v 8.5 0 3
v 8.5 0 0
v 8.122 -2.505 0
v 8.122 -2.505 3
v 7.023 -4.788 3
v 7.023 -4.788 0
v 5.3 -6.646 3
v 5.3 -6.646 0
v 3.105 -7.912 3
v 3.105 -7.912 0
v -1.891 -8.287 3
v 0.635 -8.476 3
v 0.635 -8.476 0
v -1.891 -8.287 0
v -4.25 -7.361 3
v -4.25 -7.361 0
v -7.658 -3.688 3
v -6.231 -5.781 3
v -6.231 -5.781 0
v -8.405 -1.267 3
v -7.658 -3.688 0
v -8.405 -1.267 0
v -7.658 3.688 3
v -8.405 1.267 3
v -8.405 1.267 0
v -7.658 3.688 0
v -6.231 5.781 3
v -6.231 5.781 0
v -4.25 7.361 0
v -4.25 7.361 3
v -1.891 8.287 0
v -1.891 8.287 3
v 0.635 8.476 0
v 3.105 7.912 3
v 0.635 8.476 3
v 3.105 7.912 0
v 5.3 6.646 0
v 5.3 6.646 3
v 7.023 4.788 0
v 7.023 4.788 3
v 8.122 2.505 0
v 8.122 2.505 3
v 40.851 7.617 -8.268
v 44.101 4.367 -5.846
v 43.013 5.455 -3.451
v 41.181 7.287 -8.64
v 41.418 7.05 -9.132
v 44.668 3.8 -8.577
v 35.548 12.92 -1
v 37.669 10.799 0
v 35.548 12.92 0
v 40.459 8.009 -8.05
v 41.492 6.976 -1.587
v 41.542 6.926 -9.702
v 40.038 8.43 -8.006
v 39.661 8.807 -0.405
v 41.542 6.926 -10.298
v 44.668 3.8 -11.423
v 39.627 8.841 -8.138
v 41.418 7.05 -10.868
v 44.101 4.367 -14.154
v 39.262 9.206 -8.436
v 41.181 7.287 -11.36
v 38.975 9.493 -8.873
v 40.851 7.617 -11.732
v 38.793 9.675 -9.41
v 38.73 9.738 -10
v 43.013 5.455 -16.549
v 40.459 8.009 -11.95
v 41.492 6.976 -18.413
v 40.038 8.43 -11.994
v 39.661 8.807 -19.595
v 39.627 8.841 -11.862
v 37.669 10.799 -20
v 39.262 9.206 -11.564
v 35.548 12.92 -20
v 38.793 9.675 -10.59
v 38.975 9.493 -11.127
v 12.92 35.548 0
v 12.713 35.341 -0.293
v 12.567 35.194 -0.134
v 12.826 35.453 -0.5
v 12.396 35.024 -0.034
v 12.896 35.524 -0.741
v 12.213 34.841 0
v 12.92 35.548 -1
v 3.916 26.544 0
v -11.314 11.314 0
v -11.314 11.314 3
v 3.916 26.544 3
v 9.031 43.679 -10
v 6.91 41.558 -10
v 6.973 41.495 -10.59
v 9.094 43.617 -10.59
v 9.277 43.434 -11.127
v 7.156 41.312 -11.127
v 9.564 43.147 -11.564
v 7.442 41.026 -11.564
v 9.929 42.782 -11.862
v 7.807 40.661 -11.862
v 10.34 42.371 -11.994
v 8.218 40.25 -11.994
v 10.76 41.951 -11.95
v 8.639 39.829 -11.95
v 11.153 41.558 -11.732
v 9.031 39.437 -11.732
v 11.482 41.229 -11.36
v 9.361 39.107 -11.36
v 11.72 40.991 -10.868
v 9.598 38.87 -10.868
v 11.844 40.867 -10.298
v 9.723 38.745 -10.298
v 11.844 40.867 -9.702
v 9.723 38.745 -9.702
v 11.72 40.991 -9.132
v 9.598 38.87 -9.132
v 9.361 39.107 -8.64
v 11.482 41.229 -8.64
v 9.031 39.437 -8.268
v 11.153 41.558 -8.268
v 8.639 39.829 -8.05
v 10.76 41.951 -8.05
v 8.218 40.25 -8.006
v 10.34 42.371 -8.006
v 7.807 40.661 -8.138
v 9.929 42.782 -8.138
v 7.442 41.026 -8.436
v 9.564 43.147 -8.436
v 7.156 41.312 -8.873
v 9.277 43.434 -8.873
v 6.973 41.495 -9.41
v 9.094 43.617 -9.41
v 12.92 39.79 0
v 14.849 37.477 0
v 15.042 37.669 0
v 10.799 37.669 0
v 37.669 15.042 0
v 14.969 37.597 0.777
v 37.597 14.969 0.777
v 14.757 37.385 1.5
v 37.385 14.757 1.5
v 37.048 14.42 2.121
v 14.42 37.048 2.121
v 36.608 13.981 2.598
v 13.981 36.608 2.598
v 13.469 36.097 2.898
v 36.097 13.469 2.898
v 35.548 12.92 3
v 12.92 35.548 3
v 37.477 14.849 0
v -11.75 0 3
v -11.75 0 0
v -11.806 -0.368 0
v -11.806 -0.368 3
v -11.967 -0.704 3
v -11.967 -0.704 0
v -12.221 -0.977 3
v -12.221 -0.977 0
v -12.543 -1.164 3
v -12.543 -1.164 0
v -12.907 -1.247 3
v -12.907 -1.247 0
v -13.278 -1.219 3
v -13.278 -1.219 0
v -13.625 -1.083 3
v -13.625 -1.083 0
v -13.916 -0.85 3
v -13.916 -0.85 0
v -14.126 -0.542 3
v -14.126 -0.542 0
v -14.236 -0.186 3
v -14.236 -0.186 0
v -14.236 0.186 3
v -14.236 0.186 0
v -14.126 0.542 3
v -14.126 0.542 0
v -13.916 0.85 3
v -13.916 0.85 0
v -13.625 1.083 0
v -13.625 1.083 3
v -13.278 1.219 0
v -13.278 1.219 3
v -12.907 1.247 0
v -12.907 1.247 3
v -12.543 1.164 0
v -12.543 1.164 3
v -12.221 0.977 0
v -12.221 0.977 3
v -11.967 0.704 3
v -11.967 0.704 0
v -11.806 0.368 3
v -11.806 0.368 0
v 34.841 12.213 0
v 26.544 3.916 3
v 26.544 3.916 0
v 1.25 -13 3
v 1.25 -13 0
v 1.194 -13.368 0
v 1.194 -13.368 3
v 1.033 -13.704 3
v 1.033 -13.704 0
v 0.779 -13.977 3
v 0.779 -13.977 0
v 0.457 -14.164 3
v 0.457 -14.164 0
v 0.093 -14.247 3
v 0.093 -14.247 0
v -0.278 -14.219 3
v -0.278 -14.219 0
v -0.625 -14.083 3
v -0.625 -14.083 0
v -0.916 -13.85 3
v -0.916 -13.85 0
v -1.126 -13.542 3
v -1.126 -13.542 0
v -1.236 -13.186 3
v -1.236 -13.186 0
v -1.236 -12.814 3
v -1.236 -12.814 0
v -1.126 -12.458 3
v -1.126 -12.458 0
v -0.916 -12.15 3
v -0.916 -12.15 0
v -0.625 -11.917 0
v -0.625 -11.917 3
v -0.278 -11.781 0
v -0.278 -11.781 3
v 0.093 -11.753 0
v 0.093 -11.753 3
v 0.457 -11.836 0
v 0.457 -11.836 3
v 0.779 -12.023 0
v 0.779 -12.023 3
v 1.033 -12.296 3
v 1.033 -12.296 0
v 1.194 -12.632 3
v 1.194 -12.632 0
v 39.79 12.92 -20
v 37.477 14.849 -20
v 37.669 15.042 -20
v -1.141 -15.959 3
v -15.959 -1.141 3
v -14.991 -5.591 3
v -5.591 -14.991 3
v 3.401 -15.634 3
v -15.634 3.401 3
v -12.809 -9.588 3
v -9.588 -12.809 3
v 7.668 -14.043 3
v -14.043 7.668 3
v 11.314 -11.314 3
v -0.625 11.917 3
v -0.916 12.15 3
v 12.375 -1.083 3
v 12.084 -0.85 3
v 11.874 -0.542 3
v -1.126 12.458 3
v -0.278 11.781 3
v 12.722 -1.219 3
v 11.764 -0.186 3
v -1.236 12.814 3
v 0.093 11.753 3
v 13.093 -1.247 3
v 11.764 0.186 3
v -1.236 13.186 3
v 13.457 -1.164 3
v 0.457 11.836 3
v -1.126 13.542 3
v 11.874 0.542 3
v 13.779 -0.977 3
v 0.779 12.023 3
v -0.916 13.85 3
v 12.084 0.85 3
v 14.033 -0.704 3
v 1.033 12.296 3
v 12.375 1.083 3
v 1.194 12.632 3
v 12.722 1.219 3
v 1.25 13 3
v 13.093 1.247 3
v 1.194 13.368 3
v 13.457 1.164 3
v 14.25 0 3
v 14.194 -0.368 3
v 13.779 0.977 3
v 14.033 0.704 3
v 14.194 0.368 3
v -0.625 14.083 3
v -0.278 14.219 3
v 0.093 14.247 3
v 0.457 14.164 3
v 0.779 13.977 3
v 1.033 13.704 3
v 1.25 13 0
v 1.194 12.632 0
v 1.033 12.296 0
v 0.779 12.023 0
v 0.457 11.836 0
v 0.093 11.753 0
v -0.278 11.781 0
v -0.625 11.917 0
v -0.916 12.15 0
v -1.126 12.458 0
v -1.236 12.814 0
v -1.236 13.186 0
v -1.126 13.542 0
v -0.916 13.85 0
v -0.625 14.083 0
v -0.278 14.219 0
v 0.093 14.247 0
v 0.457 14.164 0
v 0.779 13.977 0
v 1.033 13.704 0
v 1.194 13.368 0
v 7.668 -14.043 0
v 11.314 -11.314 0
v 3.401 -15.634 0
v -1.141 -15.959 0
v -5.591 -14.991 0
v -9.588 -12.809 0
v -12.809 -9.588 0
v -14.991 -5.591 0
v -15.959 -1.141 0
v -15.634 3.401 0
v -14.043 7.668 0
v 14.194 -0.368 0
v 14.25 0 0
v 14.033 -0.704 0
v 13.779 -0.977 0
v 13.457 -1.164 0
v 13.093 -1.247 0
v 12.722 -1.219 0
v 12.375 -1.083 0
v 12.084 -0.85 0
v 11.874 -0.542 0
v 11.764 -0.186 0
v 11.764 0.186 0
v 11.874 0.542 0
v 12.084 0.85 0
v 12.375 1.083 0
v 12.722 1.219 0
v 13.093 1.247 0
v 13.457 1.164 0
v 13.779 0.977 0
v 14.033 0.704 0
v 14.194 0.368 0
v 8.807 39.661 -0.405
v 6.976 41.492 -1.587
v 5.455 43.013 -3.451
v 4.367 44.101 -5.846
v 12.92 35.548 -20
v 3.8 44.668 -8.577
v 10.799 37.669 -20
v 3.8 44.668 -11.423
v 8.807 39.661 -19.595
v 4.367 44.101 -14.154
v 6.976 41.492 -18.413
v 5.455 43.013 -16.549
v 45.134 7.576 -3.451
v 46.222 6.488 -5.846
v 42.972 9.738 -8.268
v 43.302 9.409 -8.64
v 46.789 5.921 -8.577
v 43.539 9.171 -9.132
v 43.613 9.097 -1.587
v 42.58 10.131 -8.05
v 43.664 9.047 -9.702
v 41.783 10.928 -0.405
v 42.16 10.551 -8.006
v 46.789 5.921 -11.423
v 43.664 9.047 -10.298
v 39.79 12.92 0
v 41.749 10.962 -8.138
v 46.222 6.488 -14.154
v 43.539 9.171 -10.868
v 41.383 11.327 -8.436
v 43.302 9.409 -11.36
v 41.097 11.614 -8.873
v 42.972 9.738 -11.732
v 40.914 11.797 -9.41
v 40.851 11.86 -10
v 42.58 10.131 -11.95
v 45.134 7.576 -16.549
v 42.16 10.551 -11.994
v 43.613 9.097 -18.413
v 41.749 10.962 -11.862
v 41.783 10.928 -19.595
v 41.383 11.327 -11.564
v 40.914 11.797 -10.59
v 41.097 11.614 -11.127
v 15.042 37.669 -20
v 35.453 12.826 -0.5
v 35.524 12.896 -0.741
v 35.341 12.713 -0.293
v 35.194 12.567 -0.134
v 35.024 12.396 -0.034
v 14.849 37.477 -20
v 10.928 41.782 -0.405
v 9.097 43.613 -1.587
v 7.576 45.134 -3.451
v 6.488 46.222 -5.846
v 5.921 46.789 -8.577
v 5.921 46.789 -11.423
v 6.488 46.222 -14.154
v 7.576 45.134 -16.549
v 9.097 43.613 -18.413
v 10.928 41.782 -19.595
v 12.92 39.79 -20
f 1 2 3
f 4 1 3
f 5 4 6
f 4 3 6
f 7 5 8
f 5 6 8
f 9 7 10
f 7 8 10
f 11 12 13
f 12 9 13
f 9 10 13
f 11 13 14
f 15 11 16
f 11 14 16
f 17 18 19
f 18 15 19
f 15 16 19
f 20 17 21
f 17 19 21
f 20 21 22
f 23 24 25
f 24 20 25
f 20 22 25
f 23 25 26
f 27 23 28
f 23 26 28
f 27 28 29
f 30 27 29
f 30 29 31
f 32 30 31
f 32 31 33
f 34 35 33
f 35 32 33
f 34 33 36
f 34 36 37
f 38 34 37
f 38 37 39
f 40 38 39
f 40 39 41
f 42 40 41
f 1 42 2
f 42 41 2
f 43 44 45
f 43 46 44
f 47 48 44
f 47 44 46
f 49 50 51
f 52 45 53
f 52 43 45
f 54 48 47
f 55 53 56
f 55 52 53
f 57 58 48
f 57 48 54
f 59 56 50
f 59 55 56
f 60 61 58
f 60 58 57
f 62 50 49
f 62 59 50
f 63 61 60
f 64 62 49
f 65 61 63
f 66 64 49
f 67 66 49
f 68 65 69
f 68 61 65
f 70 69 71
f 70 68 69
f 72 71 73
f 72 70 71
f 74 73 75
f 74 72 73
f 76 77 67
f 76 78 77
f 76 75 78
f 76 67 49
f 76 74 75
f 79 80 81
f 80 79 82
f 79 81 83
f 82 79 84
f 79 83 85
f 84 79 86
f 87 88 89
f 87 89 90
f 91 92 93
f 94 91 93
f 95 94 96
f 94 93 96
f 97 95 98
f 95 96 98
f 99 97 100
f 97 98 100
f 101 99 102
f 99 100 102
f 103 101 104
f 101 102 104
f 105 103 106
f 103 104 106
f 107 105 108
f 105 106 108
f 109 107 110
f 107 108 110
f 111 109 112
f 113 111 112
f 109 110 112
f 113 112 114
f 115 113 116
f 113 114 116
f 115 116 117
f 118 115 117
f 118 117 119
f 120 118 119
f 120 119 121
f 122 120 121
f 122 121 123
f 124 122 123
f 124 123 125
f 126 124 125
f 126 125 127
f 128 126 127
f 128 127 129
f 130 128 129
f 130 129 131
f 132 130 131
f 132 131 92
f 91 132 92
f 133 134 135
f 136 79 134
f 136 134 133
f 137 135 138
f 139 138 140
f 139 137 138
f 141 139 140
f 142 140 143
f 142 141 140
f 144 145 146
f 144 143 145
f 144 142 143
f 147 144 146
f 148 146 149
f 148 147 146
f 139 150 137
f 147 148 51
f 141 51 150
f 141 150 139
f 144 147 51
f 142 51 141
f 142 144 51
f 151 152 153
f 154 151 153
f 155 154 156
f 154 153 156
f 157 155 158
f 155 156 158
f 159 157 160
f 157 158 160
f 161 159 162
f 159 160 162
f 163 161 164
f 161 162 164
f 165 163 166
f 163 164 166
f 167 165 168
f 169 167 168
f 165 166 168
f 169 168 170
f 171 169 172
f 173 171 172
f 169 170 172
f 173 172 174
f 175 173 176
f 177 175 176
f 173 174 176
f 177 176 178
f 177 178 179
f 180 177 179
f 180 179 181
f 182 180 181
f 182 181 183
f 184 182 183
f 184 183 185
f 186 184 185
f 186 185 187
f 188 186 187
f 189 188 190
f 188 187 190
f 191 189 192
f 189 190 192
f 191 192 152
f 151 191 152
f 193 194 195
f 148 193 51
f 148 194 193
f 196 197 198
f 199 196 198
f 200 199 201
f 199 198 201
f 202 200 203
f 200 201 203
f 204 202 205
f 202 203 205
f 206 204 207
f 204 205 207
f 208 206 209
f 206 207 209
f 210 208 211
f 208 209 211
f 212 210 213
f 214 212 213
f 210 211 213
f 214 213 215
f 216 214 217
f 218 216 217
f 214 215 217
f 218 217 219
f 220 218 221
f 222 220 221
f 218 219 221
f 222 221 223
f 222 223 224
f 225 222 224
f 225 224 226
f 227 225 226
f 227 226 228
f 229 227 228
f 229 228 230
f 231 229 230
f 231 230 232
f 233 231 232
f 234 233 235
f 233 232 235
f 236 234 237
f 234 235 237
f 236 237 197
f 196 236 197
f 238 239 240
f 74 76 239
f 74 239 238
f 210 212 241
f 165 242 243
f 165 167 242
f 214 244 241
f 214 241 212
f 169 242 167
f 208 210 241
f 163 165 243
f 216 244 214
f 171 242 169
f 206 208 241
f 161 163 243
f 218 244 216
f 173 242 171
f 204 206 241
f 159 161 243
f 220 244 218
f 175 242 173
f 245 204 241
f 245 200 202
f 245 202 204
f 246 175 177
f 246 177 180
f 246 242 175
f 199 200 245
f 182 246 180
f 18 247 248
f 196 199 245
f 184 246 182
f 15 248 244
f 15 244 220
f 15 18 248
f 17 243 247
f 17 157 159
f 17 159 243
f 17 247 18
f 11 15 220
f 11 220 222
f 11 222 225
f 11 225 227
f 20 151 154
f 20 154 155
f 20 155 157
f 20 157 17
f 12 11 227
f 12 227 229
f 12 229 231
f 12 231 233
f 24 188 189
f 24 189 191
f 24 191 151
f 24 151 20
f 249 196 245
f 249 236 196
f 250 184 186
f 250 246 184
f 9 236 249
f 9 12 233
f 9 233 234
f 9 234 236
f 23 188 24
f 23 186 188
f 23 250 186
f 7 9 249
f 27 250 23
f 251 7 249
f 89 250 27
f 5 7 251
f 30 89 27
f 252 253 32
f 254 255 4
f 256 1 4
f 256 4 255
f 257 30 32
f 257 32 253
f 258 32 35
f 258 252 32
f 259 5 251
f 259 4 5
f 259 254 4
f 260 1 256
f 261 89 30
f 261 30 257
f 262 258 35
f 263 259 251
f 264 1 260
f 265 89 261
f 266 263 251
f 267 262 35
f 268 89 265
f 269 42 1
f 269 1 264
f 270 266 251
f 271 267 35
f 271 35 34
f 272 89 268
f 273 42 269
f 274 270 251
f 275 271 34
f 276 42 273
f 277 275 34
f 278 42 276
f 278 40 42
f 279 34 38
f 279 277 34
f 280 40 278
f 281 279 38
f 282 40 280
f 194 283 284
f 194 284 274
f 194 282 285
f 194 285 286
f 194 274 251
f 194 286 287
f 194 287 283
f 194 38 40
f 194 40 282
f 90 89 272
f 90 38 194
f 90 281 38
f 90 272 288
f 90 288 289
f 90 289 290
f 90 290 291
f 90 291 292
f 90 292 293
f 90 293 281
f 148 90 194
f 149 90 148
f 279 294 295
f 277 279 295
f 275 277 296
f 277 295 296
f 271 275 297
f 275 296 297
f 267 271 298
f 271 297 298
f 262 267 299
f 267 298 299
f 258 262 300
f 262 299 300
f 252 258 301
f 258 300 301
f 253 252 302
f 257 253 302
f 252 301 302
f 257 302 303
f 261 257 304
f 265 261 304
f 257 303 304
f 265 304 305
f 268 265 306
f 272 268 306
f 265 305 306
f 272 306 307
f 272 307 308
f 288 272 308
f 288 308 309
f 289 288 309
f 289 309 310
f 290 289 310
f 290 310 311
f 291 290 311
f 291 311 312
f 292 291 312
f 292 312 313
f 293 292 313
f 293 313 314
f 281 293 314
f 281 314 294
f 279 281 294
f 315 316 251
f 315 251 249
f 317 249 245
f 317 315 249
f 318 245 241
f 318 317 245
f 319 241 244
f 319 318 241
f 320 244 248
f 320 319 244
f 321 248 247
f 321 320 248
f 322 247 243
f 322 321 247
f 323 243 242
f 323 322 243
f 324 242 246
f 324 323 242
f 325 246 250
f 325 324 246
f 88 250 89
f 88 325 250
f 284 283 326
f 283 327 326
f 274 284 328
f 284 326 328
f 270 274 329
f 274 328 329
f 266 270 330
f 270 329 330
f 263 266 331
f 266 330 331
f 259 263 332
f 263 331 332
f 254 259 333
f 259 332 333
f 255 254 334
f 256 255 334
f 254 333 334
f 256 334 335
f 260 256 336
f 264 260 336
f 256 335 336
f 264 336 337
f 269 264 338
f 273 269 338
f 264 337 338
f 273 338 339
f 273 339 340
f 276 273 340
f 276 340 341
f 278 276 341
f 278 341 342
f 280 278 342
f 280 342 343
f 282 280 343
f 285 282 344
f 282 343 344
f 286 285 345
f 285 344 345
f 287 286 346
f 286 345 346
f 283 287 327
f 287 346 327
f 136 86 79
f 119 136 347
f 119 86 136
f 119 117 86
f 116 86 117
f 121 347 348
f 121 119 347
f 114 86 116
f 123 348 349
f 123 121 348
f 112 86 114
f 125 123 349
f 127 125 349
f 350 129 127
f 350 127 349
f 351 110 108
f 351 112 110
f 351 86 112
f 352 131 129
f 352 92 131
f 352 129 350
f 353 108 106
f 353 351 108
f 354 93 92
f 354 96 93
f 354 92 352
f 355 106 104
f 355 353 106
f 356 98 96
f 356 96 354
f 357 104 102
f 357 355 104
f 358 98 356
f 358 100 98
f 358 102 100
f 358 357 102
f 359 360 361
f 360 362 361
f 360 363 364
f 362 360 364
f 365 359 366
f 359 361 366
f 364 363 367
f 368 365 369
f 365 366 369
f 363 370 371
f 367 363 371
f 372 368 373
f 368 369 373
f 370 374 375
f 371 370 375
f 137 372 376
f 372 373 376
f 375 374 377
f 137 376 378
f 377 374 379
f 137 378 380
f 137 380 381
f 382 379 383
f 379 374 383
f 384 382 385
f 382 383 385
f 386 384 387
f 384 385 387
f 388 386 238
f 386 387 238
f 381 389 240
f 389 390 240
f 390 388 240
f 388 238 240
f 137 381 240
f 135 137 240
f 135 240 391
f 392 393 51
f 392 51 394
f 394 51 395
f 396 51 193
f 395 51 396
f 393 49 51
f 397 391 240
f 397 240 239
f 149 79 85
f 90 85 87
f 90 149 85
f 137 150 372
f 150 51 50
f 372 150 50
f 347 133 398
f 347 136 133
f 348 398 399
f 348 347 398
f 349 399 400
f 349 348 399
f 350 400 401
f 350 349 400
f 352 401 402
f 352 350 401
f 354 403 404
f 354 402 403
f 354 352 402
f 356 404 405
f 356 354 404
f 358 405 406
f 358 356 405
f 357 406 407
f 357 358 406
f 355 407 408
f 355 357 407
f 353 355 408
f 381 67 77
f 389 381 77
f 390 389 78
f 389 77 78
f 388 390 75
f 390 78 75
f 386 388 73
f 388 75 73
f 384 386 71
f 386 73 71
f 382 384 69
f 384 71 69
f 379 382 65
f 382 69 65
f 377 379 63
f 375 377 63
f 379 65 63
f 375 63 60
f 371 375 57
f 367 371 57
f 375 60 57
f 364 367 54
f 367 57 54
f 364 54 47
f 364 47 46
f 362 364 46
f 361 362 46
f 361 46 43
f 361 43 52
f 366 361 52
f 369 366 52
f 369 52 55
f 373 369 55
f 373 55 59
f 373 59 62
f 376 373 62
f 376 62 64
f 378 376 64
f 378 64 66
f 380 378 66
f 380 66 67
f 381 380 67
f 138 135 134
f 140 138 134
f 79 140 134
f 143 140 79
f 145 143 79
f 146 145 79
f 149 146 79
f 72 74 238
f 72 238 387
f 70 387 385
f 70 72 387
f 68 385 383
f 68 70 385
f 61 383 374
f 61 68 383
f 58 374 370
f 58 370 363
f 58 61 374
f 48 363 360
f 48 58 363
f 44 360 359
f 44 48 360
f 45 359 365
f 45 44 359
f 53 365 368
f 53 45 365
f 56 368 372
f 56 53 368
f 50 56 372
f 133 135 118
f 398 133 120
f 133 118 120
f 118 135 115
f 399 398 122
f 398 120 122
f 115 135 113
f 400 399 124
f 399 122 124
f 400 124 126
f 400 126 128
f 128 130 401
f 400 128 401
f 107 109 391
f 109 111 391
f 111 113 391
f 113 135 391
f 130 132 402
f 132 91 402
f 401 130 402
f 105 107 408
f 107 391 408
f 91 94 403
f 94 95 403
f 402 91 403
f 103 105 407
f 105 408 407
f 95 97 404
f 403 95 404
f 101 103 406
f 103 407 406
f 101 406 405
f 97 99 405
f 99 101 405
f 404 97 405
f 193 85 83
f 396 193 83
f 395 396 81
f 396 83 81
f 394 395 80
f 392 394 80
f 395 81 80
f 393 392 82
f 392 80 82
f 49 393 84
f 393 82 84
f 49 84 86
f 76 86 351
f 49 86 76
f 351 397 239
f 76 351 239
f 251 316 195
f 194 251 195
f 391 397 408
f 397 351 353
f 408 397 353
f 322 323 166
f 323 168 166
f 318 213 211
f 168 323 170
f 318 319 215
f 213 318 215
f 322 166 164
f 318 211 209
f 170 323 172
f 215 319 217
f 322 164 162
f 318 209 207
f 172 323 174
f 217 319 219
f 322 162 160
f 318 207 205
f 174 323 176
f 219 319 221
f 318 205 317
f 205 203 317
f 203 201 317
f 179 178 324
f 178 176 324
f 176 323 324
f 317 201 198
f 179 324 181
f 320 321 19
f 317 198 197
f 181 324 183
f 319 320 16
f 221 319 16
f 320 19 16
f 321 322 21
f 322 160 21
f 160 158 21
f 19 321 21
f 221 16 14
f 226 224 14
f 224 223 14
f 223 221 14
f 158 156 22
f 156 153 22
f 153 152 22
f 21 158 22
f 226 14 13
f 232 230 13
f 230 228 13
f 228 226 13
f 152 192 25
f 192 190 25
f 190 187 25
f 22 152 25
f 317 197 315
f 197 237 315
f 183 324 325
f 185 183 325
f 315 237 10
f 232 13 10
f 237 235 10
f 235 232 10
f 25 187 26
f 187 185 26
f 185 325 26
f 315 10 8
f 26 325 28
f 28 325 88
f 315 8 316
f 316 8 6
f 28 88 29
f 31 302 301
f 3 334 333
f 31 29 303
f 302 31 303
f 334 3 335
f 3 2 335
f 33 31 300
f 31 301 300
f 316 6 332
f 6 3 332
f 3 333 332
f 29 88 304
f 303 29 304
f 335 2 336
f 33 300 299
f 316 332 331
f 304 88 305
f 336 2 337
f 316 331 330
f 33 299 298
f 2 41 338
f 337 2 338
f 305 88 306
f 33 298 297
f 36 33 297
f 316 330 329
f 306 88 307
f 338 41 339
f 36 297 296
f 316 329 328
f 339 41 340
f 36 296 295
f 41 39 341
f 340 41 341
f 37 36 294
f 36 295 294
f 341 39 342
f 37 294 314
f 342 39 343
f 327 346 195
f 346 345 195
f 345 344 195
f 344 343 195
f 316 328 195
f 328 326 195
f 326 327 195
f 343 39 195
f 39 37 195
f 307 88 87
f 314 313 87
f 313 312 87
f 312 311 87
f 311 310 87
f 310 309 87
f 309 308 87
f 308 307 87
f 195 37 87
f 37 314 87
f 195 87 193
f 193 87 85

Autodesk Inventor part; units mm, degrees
ref_plane "YZ Plane" through (0, 0, 0) normal (1, 0, 0) x (0, 1, 0)
ref_plane "XZ Plane" through (0, 0, 0) normal (0, 1, 0) x (-1, 0, 0)
ref_plane "XY Plane" through (0, 0, 0) normal (0, 0, 1) x (1, 0, 0)
sketch "Sketch1" plane through (0, 0, 0) normal (0, 0, 1) x (1, 0, 0)
  circle A0 centre (0, 0) radius 16 projected
  circle A1 centre (-13, 0) radius 1.25 projected
  circle A2 centre (0, -13) radius 1.25 projected
  circle A3 centre (13, 0) radius 1.25 projected
  circle A4 centre (0, 13) radius 1.25 projected
  circle A5 centre (0, 0) radius 8.5 projected
  line L0 (-13, 0) -> (0, -13)
  line L1 (0, -13) -> (13, 0)
  line L2 (13, 0) -> (0, 13)
  line L3 (0, 13) -> (-13, 0)
  circle A6 centre (0, 0) radius 16
  line L4 (-11.3137, 11.3137) -> (3.9161, 26.5436)
  line L5 (11.3137, -11.3137) -> (26.5436, 3.9161)
  line L6 (11.3137, 11.3137) -> (-3.2223, 25.8497)
  line L7 (-3.2223, 25.8497) -> (25.9716, -3.3441)
  line L8 (0, 22.6274) -> (10.6066, 33.234)
  line L9 (22.6274, 0) -> (33.234, 10.6066)
  line L10 (33.234, 10.6066) -> (10.6066, 33.234)
  point P0 (0, 0)
  dimension "d0" = 15
  dimension "d1" = 15
extrude "Extrusion1" add sketch "Sketch1" along normal blind 3 contours A0 | A0 L7 L5 | A0 L4 L6 | L6 L4 L8 L10 L9 L5 L7 | A1 L3 A4 L2 A3 L1 A2 L0
sketch "Sketch2" plane through (0, 0, 3) normal (0, 0, 1) x (1, 0, 0)
  line L0 (10.6066, 33.234) -> (-11.3137, 11.3137) projected
  arc A0 (-11.3137, 11.3137) -> (11.3137, -11.3137) centre (0, 0) ccw projected
  line L1 (11.3137, -11.3137) -> (33.234, 10.6066) projected
  line L2 (33.234, 10.6066) -> (10.6066, 33.234) projected
  circle A1 centre (13, 0) radius 1.25 projected
  circle A2 centre (0, -13) radius 1.25 projected
  circle A3 centre (-13, 0) radius 1.25 projected
  circle A4 centre (0, 0) radius 8.5 projected
  circle A5 centre (0, 13) radius 1.25 projected
  circle A6 centre (-13, 0) radius 1.25 projected
  circle A7 centre (0, 13) radius 1.25 projected
  line L3 (-13, 0) -> (0, 13)
  circle A8 centre (0, -13) radius 1.25 projected
  circle A9 centre (13, 0) radius 1.25 projected
  line L4 (0, -13) -> (13, 0)
  circle A10 centre (0, 0) radius 8.5 projected
  line L5 (0, 0) -> (28.2843, 28.2843)
  line L6 (-13, 0) -> (0, -13)
  line L7 (33.234, 10.6066) -> (10.6066, 33.234) projected
  line L8 (10.6066, 33.234) -> (35.7367, 58.3641)
  line L9 (33.234, 10.6066) -> (59.3246, 36.6972)
  line L10 (11.3137, -11.3137) -> (33.234, 10.6066) projected
  line L11 (10.6066, 33.234) -> (-11.3137, 11.3137) projected
  line L12 (28.2843, 28.2843) -> (39.598, 16.9706)
  line L13 (28.2843, 28.2843) -> (16.9706, 39.598)
  point P0 (0, 0)
  dimension "d4" = 40
extrude "Extrusion2" add sketch "Sketch2" against normal up to surface (3 mm away) contours L8 L13 L5 L2 | L5 L12 L9 L2
sketch "Sketch3" plane through (0, 0, 0) normal (0, 0, -1) x (-1, 0, 0)
  line L0 (-16.9706, 39.598) -> (11.3137, 11.3137) projected
  line L1 (-16.9706, 39.598) -> (-39.598, 16.9706) projected
  line L2 (-11.3137, -11.3137) -> (-39.598, 16.9706) projected
  arc A0 (-11.3137, -11.3137) -> (11.3137, 11.3137) centre (0, 0) ccw projected
  circle A1 centre (-13, 0) radius 1.25 projected
  circle A2 centre (0, -13) radius 1.25 projected
  circle A3 centre (13, 0) radius 1.25 projected
  circle A4 centre (0, 0) radius 8.5 projected
  circle A5 centre (0, 13) radius 1.25 projected
  line L3 (-11.3137, -11.3137) -> (-39.598, 16.9706) projected
  line L4 (-39.598, 16.9706) -> (-37.4767, 14.8492)
  line L5 (-37.4767, 14.8492) -> (-14.8492, 37.4767)
  line L6 (-16.9706, 39.598) -> (11.3137, 11.3137) projected
  point P0 (0, 0)
  dimension "d7" = 3
extrude "Extrusion3" add sketch "Sketch3" along normal blind 20 contours L0 L5 L2 L1
sketch "Sketch4" plane through (39.598, 16.9706, -20) normal (0.7071068, 0.7071068, 0) x (-0.7071068, 0.7071068, 0)
  line L0 (0, 23) -> (0, 0) projected
  line L1 (32, 0) -> (0, 0) projected
  line L2 (32, 23) -> (32, 0) projected
  line L3 (32, 20) -> (32, 0) projected
  line L4 (32, 0) -> (35, 0)
  line L5 (35, 0) -> (35, 20)
  line L6 (35, 20) -> (32, 20)
  line L7 (32, 20) -> (32, 0)
  line L8 (0, 20) -> (0, 0) projected
  line L9 (0, 0) -> (-3, 0)
  line L10 (-3, 0) -> (-3, 20)
  line L11 (-3, 20) -> (0, 20)
  line L12 (0, 20) -> (0, 0)
  circle A0 centre (35, 10) radius 10
  circle A1 centre (-3, 10) radius 10
  line L13 (35, 10) -> (45, 10)
  circle A2 centre (40, 10) radius 2
  line L14 (16, 20) -> (16, 0)
  line L15 (0, 0) -> (32, 0) projected
  circle A3 centre (16, 10) radius 2
  circle A4 centre (-8, 10) radius 2
  line L16 (0, 23) -> (32, 23) projected
  point P0 (32, 19)
  point P1 (-3, 0)
  point P2 (35, 0)
  dimension "d12" = 3
  dimension "d13" = 3
  dimension "d14" = 4
  dimension "d15" = 4
extrude "Extrusion4" add sketch "Sketch4" against normal blind 3 contours L0 A1 L11 | L0 A1 L10 | L10 A1 | L6 A0 L2 | L0 L9 A1 | A0 L5 L2 | A0 L13 A2 L5 | A0 L4 L2 | L13 A2 A0 L5
sketch "Sketch5" plane through (12.7279, 39.598, -10) normal (-0.7071068, -0.7071068, 0) x (-0.7071068, 0.7071068, 0)
  circle A0 centre (-43, 0) radius 2 projected
  circle A1 centre (5, 0) radius 2 projected
  line L0 (-3, -10) -> (0, -10) projected
  arc A2 (0, -10) -> (0, 10) centre (0, 0) ccw projected
  line L1 (0, 10) -> (-38, 10) projected
  arc A3 (-38, 10) -> (-38, -10) centre (-38, 0) ccw projected
  line L2 (-38, -10) -> (-35, -10) projected
  circle A4 centre (-41.5, 29.4965) radius 2.25 projected
  circle A5 centre (3.5, 29.4965) radius 2.25 projected
  line L3 (-41.5, 29.4965) -> (-41.5, -27.5248)
  line L4 (3.5, 29.4965) -> (3.5, -58.5312)
  circle A6 centre (-41.5, 0) radius 2
  circle A7 centre (3.5, 0) radius 2
  line L5 (-3, -10) -> (-35, -10) projected
  point P0 (-19, -10)
  point P1 (4.25, 1.854)
  point P2 (4.25, -1.854)
  point P3 (-42.25, -1.854)
  point P4 (-42.25, 1.854)
extrude "Extrusion5" add sketch "Sketch5" against normal blind 3 contours A6 A0 | A1 A7
sketch "Sketch6" plane through (12.7279, 39.598, -10) normal (-0.7071068, -0.7071068, 0) x (-0.7071068, 0.7071068, 0)
  arc A0 (-42.25, -1.854) -> (-42.25, 1.854) centre (-43, 0) ccw projected
  arc A1 (-42.25, 1.854) -> (-42.25, -1.854) centre (-41.5, 0) ccw projected
  arc A2 (4.25, 1.854) -> (4.25, -1.854) centre (5, 0) ccw projected
  arc A3 (4.25, -1.854) -> (4.25, 1.854) centre (3.5, 0) ccw projected
  line L0 (-3, -10) -> (0, -10) projected
  arc A4 (0, -10) -> (0, 10) centre (0, 0) ccw projected
  line L1 (0, 10) -> (-38, 10) projected
  arc A5 (-38, 10) -> (-38, -10) centre (-38, 0) ccw projected
  line L2 (-38, -10) -> (-35, -10) projected
  circle A6 centre (-41.5, 0) radius 2
  circle A7 centre (3.5, 0) radius 2
  line L3 (-3, -10) -> (-35, -10) projected
  point P0 (-19, -10)
  point P1 (-42.25, -1.854)
  point P2 (-42.25, 1.854)
  point P3 (4.25, 1.854)
extrude "Extrusion6" cut sketch "Sketch6" against normal blind 3 contours A1 A0 | A3 A2
sketch "Sketch8" plane through (0, 0, 3) normal (0, 0, 1) x (1, 0, 0)
  line L0 (16.9706, 39.598) -> (-11.3137, 11.3137) projected
  arc A0 (-11.3137, 11.3137) -> (11.3137, -11.3137) centre (0, 0) ccw projected
  line L1 (11.3137, -11.3137) -> (39.598, 16.9706) projected
  line L2 (39.598, 16.9706) -> (16.9706, 39.598) projected
  circle A1 centre (13, 0) radius 1.25 projected
  circle A2 centre (0, -13) radius 1.25 projected
  circle A3 centre (-13, 0) radius 1.25 projected
  circle A4 centre (0, 0) radius 8.5 projected
  circle A5 centre (0, 13) radius 1.25 projected
  circle A6 centre (-13, 0) radius 1.25 projected
  circle A7 centre (0, 13) radius 1.25 projected
  line L3 (-13, 0) -> (0, 13)
  circle A8 centre (13, 0) radius 1.25 projected
  line L4 (0, 13) -> (13, 0)
  line L5 (13, 0) -> (-0.0002, -13.0002)
  line L6 (0, 0) -> (26.3553, 26.3553)
  line L7 (26.3553, 26.3553) -> (50.7309, 1.9797)
  line L8 (14.8492, 37.4767) -> (37.4767, 14.8492) projected
  line L9 (26.3553, 26.3553) -> (4.9031, 47.8075)
  line L10 (5.6569, 46.669) -> (12.7279, 39.598) projected
  line L11 (14.8492, 37.4767) -> (20.1327, 42.7601)
  line L12 (20.1327, 42.7601) -> (7.1248, 51.3664)
  line L13 (7.1248, 51.3664) -> (0, 48.1905)
  line L14 (0, 48.1905) -> (14.8492, 37.4767)
  line L15 (11.3137, -11.3137) -> (37.4767, 14.8492) projected
  line L16 (37.4767, 14.8492) -> (41.6279, 19.0005)
  line L17 (41.6279, 19.0005) -> (52.2205, 8.9599)
  line L18 (52.2205, 8.9599) -> (46.7077, 4.5581)
  line L19 (46.7077, 4.5581) -> (37.4767, 13.3081)
  line L20 (37.4767, 13.3081) -> (37.4767, 14.8492)
  line L21 (11.3137, -11.3137) -> (39.598, 16.9706) projected
  point P0 (0, 0)
  point P1 (15.0416, 37.669)
  point P2 (37.669, 15.0416)
  dimension "d24" = 37.272
extrude "Extrusion7" cut sketch "Sketch8" against normal through all contours L14 L13 L12 L11 L0 | L0 L2 L1 L7 L9 | L1 L7 L18 L19 L20 | L16 L17 L18 L7 L1
sketch "Sketch9" plane through (0, 0, 3) normal (0, 0, 1) x (1, 0, 0)
  circle A0 centre (0, 13) radius 1.25 projected
  circle A1 centre (0, 0) radius 8.5 projected
  circle A2 centre (-13, 0) radius 1.25 projected
  circle A3 centre (0, -13) radius 1.25 projected
  circle A4 centre (13, 0) radius 1.25 projected
  line L0 (37.669, 15.0416) -> (15.0416, 37.669) projected
  line L1 (15.0416, 37.669) -> (-11.3137, 11.3137) projected
  arc A5 (-11.3137, 11.3137) -> (11.3137, -11.3137) centre (0, 0) ccw projected
  line L2 (11.3137, -11.3137) -> (37.669, 15.0416) projected
  line L3 (37.669, 15.0416) -> (15.0416, 37.669) projected
  line L4 (15.0416, 37.669) -> (12.9203, 35.5477)
  line L5 (15.0416, 37.669) -> (-11.3137, 11.3137) projected
  line L6 (12.9203, 35.5477) -> (38.0462, 10.4217)
  point P0 (0, 0)
  point P1 (35.5477, 12.9203)
  dimension "d27" = 3
extrude "Extrusion8" add sketch "Sketch9" against normal up to surface (23 mm away) contours L2 L6 L1 L0
sketch "Sketch10" plane through (12.9203, 35.5477, 0) normal (-0.7071068, -0.7071068, 0) x (-0.7071068, 0.7071068, 0)
  circle A0 centre (6.5, 39.4965) radius 2 projected
  circle A1 centre (6.5, 10) radius 2 projected
  circle A2 centre (-38.5, 10) radius 2 projected
  line L0 (0, 0) -> (-32, 0) projected
  line L1 (0, 0) -> (0, 20) projected
  line L2 (0, 20) -> (-32, 20) projected
  line L3 (-32, 0) -> (-32, 20) projected
  line L4 (-32, 49.4965) -> (-35, 49.4965) projected
  line L5 (-32, 29.4965) -> (-32, 49.4965) projected
  line L6 (-35, 29.4965) -> (-32, 29.4965) projected
  arc A3 (-35, 49.4965) -> (-35, 29.4965) centre (-35, 39.4965) ccw projected
  circle A4 centre (-38.5, 39.4965) radius 2.25 projected
  line L7 (0, 29.4965) -> (3, 29.4965) projected
  line L8 (0, 49.4965) -> (0, 29.4965) projected
  line L9 (3, 49.4965) -> (0, 49.4965) projected
  arc A5 (3, 29.4965) -> (3, 49.4965) centre (3, 39.4965) ccw projected
  circle A6 centre (6.5, 39.4965) radius 2.25 projected
  circle A7 centre (3, 10) radius 10
  line L10 (0, 20) -> (-32, 20) projected
  line L11 (0, 20) -> (3, 20)
  line L12 (0, 0) -> (-32, 0) projected
  line L13 (0, 0) -> (3, 0)
  line L14 (-16, 20) -> (-16, 12.7343)
  circle A8 centre (-38.5, 10) radius 2
  circle A9 centre (-35, 10) radius 10
  line L15 (-32, 20) -> (-35, 20)
  line L16 (-32, 0) -> (-35, 0)
  point P0 (-16, 0)
extrude "Extrusion9" add sketch "Sketch10" against normal blind 3 contours L1 A7 L13 | L16 A9 L3 | L1 A7 | A9 L3 | L1 L11 A7 | A9 L15 L3 picked at (1.5, 10) picked at (-33.5, 10)
fillet "Fillet4" radius 3 1 edges at (26.3553, 26.3553, 3)
fillet "Fillet5" radius 1 1 edges at (24.234, 24.234, 0)
properties part number "Uchwyt_silnika_1"
